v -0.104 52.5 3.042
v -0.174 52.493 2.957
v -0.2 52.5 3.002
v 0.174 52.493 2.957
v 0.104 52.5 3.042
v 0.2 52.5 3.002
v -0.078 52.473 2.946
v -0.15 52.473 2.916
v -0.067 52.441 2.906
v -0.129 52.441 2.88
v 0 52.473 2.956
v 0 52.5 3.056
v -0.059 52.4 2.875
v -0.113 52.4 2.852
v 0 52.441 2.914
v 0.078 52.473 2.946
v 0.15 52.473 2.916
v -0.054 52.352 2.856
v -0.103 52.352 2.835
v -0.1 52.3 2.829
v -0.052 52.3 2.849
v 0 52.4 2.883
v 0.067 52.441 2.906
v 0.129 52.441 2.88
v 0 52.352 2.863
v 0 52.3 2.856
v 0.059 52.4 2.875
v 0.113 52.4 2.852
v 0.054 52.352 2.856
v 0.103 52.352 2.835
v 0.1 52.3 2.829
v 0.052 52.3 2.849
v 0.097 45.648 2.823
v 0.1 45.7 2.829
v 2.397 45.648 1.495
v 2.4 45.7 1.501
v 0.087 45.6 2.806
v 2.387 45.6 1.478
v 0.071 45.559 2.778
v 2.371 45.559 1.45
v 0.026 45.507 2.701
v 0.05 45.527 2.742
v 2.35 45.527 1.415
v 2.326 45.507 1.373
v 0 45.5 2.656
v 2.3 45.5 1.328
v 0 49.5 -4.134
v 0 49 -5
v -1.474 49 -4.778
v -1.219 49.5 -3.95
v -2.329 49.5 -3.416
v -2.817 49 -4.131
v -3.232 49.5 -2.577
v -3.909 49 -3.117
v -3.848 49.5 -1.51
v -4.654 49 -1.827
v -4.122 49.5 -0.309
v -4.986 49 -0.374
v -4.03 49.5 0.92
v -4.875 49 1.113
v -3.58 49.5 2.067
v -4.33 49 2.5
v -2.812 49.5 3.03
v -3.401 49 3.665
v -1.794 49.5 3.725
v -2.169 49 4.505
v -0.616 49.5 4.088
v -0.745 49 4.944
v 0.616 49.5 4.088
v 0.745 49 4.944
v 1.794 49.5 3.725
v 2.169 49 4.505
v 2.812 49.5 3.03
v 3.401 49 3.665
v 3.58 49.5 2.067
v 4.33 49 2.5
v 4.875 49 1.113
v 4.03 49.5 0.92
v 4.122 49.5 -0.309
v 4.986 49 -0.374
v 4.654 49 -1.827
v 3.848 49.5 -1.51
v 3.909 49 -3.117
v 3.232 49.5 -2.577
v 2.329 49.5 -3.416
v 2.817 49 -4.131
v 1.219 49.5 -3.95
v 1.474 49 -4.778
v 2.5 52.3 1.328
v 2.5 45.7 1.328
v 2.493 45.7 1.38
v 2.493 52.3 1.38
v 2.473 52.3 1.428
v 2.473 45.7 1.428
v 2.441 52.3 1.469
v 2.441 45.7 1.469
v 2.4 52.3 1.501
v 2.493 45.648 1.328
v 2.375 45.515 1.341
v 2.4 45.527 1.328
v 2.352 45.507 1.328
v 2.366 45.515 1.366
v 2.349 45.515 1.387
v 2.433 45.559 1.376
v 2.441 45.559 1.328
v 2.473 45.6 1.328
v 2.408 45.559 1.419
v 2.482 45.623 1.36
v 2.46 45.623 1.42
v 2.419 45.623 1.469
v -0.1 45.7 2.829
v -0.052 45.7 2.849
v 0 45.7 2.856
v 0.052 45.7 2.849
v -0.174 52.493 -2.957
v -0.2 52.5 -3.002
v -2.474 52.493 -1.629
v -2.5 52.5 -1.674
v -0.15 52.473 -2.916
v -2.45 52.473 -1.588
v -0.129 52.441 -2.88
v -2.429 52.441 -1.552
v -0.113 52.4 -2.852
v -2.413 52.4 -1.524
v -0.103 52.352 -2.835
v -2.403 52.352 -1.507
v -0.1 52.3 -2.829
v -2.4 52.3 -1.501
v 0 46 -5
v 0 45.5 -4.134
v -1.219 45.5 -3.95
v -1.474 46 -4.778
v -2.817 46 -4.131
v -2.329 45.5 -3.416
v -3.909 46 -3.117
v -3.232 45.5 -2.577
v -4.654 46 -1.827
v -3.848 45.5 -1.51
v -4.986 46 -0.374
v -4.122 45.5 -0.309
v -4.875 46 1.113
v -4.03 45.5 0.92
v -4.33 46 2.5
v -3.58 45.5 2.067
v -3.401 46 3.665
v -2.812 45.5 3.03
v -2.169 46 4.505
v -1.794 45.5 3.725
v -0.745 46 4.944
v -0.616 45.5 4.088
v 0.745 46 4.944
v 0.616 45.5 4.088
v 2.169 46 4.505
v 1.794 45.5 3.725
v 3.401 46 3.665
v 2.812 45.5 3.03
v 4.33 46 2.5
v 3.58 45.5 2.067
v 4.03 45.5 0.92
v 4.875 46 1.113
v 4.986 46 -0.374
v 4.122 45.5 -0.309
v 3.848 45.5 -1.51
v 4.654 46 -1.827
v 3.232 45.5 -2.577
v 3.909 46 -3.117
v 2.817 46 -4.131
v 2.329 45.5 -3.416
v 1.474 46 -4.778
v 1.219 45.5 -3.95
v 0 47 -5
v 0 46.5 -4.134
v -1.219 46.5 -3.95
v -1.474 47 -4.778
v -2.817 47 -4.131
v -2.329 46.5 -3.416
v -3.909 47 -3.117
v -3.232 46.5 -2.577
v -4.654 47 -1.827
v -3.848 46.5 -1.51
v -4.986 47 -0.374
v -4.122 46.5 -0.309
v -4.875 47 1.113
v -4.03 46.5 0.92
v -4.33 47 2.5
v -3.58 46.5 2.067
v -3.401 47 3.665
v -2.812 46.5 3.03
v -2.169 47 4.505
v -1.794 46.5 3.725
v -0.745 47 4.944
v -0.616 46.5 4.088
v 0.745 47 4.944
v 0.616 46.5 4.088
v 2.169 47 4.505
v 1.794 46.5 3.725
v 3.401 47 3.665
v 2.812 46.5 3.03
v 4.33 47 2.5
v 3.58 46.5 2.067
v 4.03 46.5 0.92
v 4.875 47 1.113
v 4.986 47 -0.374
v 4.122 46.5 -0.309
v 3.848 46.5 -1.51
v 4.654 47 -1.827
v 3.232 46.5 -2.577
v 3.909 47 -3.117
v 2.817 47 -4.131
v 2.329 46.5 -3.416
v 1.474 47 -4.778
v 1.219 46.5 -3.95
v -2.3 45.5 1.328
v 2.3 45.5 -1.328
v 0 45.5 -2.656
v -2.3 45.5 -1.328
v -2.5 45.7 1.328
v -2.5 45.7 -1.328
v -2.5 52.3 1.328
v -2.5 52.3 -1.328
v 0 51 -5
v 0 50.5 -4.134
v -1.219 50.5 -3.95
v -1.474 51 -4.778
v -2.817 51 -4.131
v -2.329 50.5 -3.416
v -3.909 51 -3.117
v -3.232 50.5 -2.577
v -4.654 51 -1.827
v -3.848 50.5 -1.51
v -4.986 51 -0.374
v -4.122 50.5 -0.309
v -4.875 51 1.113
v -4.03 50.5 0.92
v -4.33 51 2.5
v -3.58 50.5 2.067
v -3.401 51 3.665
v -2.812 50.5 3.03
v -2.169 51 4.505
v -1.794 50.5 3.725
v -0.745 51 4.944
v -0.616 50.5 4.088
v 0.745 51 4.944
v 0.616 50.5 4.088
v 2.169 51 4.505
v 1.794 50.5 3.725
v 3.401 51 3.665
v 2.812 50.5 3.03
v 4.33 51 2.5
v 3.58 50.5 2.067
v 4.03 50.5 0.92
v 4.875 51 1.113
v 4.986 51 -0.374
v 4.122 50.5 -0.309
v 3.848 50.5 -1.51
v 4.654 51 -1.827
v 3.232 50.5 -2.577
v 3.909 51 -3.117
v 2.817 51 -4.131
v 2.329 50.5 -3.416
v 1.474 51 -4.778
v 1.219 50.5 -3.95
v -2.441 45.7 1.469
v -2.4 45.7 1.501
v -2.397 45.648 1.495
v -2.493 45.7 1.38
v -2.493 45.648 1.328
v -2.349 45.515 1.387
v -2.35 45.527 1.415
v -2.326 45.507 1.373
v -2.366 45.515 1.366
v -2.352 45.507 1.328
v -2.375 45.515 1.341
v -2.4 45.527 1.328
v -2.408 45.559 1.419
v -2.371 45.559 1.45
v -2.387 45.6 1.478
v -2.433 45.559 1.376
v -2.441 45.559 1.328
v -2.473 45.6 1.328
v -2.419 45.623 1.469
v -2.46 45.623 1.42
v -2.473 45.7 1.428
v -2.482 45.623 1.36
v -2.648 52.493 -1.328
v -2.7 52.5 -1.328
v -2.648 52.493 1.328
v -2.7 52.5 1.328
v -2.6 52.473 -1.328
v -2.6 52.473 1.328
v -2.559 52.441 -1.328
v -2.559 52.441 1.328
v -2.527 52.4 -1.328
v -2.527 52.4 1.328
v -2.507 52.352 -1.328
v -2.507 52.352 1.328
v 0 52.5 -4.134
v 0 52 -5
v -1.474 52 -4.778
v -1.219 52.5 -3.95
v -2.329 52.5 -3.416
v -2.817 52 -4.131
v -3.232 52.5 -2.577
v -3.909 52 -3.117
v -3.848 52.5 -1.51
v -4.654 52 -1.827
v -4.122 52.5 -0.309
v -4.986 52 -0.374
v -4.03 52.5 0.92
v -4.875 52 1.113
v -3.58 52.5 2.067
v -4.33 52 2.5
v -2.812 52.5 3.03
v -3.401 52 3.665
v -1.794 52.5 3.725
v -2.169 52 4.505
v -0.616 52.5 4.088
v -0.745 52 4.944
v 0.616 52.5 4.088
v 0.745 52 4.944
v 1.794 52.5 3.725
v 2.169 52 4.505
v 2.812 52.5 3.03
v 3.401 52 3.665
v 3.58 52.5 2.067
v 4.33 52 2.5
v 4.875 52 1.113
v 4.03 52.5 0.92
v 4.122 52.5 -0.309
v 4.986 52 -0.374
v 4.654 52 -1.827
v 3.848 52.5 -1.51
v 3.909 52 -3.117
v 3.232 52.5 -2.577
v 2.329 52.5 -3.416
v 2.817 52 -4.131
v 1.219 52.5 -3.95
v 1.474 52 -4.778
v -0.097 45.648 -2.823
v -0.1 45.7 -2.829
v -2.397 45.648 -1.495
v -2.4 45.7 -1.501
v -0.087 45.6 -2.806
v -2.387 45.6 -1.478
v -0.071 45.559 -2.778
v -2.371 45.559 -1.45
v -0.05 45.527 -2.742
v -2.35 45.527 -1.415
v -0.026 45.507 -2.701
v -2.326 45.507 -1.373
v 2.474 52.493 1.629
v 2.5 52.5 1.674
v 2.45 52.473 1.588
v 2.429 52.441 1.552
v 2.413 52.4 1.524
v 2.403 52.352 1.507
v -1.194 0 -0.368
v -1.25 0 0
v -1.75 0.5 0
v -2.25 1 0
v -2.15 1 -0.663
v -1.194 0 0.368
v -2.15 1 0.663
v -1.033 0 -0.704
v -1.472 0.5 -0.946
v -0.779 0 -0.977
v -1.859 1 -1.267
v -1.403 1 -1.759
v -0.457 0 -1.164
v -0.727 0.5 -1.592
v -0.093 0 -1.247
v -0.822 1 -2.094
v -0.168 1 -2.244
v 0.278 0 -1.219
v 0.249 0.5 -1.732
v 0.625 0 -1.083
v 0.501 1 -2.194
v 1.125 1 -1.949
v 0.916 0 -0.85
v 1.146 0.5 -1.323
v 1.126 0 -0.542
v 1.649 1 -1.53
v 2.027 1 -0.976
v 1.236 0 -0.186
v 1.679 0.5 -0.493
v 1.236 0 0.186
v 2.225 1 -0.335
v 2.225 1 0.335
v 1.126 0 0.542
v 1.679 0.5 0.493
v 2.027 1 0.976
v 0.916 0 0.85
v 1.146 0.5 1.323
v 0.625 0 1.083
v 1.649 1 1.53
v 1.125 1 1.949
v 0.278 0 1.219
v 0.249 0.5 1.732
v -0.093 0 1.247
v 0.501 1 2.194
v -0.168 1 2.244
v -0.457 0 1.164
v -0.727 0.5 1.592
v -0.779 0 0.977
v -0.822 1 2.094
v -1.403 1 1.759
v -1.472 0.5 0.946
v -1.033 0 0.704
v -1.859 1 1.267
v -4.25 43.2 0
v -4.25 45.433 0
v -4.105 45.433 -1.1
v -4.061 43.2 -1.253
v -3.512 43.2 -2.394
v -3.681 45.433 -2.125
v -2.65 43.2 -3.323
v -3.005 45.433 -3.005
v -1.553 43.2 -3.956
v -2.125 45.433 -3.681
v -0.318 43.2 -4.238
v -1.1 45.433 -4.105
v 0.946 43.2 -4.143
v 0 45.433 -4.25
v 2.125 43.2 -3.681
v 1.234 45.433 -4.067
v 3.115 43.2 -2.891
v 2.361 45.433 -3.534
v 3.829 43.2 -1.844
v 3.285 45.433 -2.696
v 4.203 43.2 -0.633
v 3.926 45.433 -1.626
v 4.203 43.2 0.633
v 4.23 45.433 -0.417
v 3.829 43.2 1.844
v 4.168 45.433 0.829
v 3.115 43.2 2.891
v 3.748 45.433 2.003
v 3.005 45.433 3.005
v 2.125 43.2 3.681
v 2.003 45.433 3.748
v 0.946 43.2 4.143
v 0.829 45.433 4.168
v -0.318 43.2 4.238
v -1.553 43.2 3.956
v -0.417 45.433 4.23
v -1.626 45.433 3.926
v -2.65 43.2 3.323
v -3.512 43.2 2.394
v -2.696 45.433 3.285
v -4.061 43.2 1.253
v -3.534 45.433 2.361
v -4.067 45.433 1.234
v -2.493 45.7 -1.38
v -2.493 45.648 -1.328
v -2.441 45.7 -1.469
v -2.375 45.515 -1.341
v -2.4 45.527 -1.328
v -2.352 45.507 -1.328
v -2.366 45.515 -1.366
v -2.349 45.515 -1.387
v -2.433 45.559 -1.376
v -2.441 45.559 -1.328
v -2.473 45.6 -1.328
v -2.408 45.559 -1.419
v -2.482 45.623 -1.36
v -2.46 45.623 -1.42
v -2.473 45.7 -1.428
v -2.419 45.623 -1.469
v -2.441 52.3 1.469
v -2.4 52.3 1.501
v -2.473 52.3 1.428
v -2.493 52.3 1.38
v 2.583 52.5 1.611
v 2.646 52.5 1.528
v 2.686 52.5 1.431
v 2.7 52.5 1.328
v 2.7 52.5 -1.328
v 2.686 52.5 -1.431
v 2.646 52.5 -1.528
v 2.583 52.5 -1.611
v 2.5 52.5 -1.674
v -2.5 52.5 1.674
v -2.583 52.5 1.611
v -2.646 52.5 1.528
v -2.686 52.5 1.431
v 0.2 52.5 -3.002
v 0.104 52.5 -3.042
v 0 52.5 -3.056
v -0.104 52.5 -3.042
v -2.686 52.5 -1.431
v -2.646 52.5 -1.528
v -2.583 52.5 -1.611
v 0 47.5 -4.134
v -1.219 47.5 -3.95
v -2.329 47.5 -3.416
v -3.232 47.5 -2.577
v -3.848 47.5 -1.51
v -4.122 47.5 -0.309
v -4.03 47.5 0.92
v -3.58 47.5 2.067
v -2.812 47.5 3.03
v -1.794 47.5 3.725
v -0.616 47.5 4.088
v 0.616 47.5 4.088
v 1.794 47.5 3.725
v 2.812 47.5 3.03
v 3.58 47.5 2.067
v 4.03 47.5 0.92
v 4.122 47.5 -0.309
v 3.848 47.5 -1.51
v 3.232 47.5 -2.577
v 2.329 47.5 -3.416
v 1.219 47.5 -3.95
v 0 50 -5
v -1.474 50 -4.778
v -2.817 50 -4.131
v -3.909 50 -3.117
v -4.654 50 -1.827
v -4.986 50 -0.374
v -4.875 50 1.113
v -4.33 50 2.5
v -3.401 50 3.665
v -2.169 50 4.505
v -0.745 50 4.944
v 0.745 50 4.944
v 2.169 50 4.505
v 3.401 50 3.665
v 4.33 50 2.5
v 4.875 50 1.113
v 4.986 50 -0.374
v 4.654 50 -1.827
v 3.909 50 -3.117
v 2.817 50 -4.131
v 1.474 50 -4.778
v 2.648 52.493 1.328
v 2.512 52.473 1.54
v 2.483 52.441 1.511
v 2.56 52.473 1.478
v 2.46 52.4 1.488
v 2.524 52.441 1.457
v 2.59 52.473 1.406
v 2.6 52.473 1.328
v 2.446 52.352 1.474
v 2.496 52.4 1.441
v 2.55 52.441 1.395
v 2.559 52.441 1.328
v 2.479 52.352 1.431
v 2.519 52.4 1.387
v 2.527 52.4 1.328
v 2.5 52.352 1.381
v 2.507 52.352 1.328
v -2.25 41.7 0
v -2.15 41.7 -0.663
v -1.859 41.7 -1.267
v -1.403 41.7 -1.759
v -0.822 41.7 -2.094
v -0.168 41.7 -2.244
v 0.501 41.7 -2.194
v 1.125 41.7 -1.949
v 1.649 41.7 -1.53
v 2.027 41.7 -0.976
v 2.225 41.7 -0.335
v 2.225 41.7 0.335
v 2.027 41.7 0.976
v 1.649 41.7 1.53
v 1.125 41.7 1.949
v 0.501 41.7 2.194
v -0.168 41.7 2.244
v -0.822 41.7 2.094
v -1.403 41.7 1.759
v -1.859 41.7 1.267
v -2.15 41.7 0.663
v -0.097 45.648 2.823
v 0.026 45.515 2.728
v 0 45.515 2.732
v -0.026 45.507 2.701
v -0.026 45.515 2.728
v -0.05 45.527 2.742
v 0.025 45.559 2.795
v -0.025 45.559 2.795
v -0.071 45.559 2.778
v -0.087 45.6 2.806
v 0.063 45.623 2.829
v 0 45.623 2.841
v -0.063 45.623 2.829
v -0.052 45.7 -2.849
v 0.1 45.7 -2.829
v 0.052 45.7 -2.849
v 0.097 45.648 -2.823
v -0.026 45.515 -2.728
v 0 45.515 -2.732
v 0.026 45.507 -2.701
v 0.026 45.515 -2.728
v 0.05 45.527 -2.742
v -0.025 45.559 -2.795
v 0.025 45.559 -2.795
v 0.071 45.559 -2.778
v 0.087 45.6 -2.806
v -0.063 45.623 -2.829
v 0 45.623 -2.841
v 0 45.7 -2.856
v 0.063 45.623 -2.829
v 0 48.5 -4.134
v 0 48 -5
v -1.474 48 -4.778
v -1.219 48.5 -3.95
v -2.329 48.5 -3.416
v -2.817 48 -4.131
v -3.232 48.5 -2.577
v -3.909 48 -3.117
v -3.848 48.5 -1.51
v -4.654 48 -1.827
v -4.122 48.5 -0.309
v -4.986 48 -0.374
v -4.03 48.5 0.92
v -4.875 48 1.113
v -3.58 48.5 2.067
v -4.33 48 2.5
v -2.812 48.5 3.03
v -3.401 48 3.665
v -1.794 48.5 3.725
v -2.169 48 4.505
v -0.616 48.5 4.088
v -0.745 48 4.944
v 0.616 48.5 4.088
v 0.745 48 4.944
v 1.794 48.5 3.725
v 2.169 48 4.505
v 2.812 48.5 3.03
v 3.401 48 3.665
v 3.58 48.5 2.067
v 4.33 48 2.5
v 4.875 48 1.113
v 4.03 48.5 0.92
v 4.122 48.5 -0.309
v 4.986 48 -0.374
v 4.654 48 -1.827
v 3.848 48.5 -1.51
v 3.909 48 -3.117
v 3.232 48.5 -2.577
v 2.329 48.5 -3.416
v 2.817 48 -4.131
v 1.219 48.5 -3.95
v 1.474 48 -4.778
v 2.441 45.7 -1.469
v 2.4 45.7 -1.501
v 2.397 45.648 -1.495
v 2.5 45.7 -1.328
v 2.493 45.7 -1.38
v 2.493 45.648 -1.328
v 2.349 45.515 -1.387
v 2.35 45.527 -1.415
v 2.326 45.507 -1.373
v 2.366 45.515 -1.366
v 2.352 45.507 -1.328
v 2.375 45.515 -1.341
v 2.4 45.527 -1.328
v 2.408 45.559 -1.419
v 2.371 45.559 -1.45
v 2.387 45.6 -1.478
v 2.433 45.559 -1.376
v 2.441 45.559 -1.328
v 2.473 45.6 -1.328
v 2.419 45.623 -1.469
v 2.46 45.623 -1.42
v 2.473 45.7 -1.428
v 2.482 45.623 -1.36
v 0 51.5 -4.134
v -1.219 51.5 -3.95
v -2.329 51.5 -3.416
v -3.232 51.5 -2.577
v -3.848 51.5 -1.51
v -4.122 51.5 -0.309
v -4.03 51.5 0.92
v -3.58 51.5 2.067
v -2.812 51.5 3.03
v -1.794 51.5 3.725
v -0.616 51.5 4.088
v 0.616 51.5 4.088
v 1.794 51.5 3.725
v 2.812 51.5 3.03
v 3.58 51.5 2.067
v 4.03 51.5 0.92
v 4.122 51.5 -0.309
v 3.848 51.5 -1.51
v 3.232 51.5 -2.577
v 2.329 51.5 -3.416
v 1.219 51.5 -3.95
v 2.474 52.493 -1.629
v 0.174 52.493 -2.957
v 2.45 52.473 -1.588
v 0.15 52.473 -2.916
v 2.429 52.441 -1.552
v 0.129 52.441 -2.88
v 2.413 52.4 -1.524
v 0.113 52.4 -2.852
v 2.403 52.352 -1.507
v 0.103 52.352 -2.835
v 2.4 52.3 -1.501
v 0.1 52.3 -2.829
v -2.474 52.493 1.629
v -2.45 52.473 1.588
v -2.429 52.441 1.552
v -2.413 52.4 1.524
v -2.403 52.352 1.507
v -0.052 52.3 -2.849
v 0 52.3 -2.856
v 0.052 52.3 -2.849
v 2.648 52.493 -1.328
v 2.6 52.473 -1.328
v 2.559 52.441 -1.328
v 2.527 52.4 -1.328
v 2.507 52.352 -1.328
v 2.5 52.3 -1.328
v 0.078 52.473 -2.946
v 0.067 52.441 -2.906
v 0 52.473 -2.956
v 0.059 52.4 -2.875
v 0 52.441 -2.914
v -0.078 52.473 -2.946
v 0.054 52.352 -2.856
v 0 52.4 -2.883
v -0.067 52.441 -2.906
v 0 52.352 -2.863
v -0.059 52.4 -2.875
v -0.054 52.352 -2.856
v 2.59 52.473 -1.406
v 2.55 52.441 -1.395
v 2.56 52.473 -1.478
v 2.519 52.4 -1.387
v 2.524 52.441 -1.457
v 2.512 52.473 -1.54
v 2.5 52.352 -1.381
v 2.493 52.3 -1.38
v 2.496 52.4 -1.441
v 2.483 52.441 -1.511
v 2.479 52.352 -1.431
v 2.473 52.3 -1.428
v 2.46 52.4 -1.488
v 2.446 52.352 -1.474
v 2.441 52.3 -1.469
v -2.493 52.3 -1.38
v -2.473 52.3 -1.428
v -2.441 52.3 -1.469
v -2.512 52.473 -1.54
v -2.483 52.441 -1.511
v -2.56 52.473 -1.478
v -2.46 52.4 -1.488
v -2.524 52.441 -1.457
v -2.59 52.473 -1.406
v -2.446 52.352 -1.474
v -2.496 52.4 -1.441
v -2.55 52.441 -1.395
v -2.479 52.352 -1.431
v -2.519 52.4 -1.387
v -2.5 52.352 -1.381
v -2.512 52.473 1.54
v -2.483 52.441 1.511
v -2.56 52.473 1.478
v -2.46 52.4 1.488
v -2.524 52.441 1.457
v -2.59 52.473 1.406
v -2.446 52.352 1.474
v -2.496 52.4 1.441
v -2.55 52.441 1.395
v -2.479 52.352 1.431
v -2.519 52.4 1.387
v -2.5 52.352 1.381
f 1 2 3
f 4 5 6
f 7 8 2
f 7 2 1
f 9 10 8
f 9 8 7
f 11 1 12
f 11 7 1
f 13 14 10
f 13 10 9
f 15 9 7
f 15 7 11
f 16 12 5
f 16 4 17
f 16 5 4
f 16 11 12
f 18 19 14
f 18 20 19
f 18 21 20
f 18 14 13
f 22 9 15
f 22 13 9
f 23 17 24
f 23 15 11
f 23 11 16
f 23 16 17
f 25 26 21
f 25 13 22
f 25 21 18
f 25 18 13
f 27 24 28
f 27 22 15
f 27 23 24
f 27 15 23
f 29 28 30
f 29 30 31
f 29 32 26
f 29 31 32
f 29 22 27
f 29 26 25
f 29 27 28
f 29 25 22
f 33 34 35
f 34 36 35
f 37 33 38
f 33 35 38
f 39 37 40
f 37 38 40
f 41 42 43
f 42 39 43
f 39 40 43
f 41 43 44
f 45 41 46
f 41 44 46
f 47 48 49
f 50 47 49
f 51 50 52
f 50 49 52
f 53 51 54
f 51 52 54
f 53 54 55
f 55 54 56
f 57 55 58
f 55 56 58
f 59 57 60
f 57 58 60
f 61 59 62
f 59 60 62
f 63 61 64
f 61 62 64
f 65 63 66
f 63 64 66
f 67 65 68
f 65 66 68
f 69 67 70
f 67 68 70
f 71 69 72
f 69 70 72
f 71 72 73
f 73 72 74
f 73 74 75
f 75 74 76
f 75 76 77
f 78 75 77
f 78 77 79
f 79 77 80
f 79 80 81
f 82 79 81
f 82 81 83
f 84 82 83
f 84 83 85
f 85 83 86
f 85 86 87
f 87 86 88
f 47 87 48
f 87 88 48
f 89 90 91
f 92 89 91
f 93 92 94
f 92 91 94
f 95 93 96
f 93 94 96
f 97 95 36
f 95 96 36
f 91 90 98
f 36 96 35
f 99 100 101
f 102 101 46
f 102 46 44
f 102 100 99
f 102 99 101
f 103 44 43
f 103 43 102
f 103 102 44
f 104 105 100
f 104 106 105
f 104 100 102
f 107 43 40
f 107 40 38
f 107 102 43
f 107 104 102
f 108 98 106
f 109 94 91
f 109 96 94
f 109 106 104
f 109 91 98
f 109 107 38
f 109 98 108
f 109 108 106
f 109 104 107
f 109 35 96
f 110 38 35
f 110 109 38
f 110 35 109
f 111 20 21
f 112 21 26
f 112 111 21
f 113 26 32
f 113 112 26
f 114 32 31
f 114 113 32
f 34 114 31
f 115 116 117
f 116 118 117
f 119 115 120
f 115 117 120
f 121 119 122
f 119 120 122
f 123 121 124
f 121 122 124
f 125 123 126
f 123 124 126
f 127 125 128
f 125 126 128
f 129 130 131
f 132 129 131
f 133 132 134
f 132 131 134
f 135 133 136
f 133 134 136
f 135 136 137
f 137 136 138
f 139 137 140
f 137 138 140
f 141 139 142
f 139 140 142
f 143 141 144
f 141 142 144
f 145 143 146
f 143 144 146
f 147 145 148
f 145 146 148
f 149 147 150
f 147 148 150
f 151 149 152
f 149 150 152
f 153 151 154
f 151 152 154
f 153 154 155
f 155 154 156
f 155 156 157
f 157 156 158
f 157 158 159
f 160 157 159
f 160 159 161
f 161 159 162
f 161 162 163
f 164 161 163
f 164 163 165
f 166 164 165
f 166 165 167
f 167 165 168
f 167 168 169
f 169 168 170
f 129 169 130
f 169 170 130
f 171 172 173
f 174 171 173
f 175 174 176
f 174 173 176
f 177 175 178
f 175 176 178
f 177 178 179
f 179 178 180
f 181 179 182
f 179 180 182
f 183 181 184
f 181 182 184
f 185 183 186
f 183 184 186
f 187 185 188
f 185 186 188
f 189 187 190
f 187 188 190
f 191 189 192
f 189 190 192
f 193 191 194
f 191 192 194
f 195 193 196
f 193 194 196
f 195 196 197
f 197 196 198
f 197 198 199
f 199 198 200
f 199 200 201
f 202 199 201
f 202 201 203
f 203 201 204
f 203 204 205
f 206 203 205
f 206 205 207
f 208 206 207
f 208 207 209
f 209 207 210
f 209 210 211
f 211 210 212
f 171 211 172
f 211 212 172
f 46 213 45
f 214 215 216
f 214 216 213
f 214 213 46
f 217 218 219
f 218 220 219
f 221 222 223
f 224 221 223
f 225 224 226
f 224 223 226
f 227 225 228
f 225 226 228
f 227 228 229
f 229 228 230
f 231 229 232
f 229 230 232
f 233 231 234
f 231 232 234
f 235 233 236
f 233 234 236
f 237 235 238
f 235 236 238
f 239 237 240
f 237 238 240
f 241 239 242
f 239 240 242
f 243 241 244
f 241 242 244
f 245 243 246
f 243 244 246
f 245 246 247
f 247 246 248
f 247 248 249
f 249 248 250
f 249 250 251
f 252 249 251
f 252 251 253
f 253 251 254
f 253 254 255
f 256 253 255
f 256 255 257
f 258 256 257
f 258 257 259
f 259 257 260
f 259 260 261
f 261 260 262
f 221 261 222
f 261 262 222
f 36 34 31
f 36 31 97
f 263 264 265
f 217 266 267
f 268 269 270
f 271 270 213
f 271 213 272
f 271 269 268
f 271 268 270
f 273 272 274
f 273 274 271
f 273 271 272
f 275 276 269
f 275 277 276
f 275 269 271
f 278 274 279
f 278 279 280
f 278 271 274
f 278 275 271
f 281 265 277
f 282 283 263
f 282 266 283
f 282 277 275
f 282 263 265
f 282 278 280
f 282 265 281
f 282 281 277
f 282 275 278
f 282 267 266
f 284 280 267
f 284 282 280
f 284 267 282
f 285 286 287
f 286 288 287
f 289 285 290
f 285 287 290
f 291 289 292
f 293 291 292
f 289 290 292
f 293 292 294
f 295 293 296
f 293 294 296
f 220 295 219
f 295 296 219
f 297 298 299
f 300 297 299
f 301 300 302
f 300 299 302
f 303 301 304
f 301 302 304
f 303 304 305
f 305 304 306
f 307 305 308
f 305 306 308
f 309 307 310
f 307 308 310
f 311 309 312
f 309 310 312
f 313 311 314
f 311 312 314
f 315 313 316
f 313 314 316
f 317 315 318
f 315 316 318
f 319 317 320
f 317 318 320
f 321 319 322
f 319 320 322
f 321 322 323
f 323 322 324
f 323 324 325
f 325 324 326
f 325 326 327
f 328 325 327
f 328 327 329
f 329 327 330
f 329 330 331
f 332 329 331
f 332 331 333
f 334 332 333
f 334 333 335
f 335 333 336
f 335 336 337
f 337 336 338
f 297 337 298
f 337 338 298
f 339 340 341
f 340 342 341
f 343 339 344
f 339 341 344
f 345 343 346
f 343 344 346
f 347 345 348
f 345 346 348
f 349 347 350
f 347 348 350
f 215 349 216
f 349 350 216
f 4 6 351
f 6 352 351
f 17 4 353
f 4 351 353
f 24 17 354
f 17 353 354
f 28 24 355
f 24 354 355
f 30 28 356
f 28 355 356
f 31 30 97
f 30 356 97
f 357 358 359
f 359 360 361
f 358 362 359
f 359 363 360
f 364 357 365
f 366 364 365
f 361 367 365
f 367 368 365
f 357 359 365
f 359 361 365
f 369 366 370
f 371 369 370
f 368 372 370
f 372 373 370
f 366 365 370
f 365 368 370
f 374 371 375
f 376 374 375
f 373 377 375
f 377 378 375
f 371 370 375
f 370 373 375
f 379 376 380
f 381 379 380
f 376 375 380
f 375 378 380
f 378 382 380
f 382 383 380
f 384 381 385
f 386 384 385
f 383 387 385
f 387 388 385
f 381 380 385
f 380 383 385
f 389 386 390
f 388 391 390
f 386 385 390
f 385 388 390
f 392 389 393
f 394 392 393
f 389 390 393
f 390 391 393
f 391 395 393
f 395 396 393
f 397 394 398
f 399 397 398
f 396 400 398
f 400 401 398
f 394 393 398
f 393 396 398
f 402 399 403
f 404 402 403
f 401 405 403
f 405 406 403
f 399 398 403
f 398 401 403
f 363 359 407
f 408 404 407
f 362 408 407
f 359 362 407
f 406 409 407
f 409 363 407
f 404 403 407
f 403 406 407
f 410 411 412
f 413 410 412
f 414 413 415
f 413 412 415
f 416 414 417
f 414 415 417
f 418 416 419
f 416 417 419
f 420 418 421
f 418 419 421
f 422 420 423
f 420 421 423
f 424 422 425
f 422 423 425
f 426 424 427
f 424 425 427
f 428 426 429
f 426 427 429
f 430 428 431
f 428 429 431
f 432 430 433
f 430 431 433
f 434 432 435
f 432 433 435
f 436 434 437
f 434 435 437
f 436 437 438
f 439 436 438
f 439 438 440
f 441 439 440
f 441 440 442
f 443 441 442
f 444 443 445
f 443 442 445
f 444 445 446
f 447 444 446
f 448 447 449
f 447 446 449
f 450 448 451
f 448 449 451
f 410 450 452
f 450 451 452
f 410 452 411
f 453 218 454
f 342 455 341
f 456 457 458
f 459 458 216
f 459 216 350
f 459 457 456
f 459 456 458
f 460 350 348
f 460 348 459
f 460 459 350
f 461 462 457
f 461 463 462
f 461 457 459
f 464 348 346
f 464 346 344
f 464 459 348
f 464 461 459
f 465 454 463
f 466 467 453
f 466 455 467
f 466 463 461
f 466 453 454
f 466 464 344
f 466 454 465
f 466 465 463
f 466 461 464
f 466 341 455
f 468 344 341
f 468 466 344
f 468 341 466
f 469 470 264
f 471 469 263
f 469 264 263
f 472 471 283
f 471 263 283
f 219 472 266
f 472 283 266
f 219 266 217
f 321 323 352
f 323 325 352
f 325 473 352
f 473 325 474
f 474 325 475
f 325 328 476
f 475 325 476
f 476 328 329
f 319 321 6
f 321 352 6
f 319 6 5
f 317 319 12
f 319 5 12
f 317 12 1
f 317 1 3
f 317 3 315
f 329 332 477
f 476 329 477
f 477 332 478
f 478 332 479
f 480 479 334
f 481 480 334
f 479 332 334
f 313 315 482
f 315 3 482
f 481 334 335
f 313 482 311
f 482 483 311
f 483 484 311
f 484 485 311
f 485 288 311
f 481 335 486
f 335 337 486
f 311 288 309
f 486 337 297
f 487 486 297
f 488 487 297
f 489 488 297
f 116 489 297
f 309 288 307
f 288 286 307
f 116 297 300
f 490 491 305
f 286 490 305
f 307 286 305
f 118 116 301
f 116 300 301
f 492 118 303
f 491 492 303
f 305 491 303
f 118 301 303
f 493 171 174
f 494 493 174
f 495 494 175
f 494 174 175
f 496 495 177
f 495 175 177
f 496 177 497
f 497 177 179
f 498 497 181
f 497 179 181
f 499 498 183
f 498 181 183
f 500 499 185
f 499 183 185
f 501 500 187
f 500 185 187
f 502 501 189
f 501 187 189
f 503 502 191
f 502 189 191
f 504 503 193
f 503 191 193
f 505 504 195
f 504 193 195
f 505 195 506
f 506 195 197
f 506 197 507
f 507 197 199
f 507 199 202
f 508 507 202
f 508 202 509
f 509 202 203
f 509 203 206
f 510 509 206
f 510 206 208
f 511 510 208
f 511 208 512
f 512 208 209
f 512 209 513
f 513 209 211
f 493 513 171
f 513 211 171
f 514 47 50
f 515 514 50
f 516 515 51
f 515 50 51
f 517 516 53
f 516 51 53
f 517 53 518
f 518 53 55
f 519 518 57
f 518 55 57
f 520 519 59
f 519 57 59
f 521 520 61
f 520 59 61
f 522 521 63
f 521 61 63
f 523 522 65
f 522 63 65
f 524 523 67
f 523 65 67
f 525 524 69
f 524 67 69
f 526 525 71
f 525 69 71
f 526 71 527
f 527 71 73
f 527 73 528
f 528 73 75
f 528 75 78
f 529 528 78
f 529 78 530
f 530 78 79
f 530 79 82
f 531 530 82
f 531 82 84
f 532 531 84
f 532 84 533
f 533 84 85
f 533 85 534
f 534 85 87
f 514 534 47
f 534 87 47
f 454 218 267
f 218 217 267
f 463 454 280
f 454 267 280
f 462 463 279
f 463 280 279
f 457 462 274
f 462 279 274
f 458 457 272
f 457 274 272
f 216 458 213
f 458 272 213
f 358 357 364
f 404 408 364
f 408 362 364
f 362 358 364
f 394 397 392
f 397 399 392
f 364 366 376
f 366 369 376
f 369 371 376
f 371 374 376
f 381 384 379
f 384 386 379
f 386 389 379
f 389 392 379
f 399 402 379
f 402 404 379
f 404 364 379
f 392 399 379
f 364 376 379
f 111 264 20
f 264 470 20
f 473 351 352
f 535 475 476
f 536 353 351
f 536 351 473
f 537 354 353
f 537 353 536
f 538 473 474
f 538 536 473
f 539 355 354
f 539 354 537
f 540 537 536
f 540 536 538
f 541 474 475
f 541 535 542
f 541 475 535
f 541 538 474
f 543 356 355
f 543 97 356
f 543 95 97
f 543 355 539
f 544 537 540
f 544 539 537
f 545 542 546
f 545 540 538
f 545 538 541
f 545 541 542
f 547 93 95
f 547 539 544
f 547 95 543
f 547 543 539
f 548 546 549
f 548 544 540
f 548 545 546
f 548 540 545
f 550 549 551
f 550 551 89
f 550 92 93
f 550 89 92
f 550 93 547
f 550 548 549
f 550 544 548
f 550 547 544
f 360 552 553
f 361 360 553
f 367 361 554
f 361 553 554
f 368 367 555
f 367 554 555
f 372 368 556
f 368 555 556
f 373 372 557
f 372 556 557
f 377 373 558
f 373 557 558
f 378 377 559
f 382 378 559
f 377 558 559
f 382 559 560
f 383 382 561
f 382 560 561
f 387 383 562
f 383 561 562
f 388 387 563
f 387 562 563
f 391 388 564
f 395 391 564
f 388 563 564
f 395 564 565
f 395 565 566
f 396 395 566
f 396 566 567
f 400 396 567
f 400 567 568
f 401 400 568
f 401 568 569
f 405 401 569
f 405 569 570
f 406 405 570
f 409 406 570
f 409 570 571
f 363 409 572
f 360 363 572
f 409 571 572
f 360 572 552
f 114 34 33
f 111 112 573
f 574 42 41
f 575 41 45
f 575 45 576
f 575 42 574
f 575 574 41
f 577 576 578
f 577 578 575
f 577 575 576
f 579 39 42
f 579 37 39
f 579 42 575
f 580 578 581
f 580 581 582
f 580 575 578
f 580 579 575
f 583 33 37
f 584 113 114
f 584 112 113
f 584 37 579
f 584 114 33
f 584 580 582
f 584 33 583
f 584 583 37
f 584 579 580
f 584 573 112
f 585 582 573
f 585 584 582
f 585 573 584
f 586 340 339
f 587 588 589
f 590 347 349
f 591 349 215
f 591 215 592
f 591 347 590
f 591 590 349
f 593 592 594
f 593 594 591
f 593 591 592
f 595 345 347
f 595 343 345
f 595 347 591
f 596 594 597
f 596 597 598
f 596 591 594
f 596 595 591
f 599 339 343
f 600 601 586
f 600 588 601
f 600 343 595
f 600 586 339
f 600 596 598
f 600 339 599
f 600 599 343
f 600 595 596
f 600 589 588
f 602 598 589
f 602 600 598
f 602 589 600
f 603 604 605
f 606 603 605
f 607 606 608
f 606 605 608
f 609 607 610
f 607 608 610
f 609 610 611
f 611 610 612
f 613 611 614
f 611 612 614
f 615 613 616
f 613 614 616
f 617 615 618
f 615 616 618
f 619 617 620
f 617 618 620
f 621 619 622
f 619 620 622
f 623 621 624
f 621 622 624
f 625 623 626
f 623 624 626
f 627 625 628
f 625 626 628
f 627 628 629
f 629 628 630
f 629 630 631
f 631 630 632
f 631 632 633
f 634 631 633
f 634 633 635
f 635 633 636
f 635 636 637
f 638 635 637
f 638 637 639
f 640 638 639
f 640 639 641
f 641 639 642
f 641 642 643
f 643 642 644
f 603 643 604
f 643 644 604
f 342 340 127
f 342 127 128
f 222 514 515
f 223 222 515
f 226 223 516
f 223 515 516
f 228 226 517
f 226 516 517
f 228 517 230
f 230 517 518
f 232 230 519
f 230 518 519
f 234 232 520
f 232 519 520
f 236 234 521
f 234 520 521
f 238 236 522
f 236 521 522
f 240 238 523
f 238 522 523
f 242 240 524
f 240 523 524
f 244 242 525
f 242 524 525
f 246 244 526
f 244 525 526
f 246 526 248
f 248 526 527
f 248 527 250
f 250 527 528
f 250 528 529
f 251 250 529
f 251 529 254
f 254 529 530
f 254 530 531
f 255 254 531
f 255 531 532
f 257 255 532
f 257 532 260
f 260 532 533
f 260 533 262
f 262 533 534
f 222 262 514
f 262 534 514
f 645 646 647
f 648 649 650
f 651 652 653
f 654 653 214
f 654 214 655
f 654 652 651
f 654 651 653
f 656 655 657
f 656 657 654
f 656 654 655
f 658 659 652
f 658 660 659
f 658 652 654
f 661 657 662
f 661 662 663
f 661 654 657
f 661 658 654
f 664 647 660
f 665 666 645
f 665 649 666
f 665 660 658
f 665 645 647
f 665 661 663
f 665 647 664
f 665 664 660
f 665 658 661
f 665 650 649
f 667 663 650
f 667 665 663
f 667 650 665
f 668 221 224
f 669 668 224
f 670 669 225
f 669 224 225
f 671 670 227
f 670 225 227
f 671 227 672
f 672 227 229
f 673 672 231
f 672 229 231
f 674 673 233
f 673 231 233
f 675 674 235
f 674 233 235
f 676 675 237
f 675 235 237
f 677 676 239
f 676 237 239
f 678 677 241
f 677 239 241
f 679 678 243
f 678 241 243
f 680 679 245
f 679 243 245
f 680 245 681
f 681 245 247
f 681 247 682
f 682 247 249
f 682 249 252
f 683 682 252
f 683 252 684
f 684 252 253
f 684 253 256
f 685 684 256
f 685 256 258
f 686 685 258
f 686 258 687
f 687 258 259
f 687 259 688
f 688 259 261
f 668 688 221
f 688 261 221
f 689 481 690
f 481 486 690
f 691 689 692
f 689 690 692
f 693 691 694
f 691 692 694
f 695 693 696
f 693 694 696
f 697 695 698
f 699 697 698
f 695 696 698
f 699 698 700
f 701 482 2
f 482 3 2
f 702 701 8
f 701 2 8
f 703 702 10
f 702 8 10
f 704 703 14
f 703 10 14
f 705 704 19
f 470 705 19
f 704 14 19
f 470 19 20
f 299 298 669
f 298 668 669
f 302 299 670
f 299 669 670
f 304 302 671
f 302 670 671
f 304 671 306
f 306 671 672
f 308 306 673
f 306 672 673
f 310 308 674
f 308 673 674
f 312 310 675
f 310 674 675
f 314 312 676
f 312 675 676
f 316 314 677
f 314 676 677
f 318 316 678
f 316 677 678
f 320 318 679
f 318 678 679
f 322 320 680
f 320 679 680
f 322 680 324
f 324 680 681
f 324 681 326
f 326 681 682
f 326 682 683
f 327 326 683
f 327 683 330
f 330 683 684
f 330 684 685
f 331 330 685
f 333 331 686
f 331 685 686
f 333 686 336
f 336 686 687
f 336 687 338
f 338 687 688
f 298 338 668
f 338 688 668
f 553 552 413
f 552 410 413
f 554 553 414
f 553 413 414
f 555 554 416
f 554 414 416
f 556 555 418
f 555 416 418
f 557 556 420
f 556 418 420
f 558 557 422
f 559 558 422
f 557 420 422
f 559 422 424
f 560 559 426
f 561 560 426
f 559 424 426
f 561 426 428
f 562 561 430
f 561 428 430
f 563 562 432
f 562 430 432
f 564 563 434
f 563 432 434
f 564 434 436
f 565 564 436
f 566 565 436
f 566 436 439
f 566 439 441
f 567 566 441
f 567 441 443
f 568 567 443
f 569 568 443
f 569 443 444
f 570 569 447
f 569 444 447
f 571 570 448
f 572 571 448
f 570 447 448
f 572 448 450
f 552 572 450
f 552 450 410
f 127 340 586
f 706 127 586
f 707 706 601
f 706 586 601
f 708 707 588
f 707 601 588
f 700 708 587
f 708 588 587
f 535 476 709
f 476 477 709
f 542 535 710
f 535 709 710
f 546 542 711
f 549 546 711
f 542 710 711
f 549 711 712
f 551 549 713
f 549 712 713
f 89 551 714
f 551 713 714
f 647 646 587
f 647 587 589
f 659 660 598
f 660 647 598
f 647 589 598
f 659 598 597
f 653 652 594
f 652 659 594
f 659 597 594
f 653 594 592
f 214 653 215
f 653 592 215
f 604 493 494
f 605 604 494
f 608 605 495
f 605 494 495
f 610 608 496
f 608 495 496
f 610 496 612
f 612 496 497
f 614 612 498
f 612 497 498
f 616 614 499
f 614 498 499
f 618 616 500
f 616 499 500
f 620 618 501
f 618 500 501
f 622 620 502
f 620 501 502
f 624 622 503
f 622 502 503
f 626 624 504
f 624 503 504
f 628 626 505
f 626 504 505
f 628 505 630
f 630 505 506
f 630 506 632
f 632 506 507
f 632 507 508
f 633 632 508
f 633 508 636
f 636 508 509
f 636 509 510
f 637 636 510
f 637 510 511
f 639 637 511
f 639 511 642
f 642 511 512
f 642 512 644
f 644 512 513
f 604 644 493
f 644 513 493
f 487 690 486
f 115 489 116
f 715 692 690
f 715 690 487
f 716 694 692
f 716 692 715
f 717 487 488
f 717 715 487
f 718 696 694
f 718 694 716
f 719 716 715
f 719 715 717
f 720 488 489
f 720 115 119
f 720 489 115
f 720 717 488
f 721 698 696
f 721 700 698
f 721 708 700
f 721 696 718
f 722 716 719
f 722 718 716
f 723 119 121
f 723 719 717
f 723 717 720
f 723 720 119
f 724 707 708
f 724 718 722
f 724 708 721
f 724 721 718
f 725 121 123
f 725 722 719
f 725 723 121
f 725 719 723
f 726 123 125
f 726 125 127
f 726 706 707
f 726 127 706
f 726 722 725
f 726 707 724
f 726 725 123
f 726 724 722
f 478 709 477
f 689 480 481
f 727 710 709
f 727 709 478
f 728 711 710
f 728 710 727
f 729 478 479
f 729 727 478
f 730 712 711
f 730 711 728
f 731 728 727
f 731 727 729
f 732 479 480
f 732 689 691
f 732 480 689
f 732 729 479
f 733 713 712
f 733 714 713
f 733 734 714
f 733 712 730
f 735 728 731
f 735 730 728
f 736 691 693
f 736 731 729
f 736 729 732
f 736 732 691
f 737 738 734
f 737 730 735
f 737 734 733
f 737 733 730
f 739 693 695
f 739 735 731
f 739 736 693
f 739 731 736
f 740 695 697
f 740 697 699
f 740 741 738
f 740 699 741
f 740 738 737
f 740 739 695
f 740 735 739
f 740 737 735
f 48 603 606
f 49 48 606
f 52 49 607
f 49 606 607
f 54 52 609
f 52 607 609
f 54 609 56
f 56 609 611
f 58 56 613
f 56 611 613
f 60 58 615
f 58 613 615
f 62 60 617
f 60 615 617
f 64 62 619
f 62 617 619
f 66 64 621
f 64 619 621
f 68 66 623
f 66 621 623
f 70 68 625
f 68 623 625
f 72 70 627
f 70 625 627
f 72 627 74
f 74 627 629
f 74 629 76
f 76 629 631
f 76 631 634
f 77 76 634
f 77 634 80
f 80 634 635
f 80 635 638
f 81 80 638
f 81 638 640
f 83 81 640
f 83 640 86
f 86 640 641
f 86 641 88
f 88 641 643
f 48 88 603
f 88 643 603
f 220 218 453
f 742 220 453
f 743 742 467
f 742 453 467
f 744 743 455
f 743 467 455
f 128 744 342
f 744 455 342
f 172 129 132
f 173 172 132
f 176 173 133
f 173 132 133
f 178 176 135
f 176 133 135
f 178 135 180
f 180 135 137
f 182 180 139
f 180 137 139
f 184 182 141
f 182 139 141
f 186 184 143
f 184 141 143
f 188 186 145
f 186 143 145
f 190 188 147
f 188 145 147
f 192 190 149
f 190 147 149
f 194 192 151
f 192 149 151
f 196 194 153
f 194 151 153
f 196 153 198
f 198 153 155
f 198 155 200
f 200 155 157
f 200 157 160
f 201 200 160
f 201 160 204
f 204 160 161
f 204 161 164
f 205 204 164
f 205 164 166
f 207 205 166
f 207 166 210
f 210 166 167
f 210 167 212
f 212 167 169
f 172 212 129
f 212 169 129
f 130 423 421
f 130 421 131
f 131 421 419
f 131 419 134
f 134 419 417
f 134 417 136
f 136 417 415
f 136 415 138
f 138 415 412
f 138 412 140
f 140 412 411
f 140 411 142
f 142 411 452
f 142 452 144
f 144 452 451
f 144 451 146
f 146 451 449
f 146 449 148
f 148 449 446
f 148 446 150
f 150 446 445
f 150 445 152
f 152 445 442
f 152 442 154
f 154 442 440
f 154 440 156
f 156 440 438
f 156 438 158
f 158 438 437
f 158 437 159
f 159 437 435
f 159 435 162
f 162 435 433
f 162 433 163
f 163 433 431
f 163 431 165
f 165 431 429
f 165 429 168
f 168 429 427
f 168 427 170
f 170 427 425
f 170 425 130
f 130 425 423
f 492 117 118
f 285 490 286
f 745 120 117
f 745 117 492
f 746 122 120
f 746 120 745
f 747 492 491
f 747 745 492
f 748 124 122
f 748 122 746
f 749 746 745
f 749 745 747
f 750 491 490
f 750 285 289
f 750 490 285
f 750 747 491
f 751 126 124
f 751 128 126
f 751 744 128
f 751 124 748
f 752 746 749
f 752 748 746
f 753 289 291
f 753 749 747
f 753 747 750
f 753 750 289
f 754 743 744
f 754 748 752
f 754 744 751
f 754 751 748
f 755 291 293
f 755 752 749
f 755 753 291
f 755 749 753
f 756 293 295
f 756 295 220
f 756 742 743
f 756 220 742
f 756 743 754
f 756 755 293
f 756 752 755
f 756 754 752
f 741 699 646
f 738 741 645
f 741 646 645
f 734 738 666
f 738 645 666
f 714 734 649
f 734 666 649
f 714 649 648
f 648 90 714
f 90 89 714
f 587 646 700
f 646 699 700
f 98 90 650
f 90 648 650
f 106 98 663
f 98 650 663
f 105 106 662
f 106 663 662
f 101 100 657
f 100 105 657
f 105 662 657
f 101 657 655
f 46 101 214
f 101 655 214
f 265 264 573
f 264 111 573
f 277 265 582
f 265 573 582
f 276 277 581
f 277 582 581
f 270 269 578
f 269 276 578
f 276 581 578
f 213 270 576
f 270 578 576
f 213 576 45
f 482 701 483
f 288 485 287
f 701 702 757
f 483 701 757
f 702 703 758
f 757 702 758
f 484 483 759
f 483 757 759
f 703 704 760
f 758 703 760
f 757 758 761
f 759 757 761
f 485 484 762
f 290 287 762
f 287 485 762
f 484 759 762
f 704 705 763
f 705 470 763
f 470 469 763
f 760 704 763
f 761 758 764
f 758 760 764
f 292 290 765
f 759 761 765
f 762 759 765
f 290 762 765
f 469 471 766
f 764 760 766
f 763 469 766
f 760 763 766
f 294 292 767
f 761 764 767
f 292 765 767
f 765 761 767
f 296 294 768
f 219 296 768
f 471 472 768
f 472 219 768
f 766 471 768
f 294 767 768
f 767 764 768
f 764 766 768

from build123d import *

# Parameters (mm, degrees)
CHAMFER1_SIZE      = 1
CHAMFER2_SIZE      = 0.5
CUT_EXTRUDE1_DEPTH = 7
FILLET1_R          = 0.2


with BuildPart() as part:
    # Sketch1 → Revolve1 (revolve)
    with BuildSketch(Plane.XY):
        Polygon((0, 0), (-2.25, 0), (-2.25, 41.7), (-4.25, 43.2), (-4.25, 45.5), (-5, 45.5), (-5, 52.5), (0, 52.5), align=None)
    revolve(axis=Axis((0, 52.5, 0), (0, -1, 0)))

    # Chamfer1
    chamfer1_edges = [part.edges().sort_by_distance(p)[0] for p in [
        (2.25, 0, 0),
    ]]
    chamfer(chamfer1_edges, length=CHAMFER1_SIZE)

    # Chamfer2
    chamfer2_edges = [part.edges().sort_by_distance(p)[0] for p in [
        (5, 52.5, 0),
    ]]
    chamfer(chamfer2_edges, length=CHAMFER2_SIZE)

    # Sketch2 → Cut-Extrude1 (cut)
    with BuildSketch(Plane(origin=(0, 52.5, 0), x_dir=(1, 0, 0), z_dir=(0, 1, 0))):
        Polygon((0, -2.886751346), (2.5, -1.443375673), (2.5, 1.443375673), (0, 2.886751346), (-2.5, 1.443375673), (-2.5, -1.443375673), align=None)
    extrude(amount=-CUT_EXTRUDE1_DEPTH, mode=Mode.SUBTRACT)

    # Fillet1
    fillet1_edges = [part.edges().sort_by_distance(p)[0] for p in [
        (-1.25, 45.5, 2.165063509),
        (0, 49, 2.886751346),
        (-2.5, 45.5, 0),
        (-2.5, 49, 1.443375673),
        (-1.25, 45.5, -2.165063509),
        (-2.5, 49, -1.443375673),
        (1.25, 45.5, -2.165063509),
        (0, 49, -2.886751346),
        (2.5, 45.5, 0),
        (2.5, 49, -1.443375673),
        (1.25, 45.5, 2.165063509),
        (2.5, 49, 1.443375673),
        (-1.25, 52.5, 2.165063509),
        (1.25, 52.5, 2.165063509),
        (2.5, 52.5, 0),
        (1.25, 52.5, -2.165063509),
        (-1.25, 52.5, -2.165063509),
        (-2.5, 52.5, 0),
    ]]
    fillet(fillet1_edges, radius=FILLET1_R)

    # Sketch3 → Cut-Revolve1 (revolve, cut)
    with BuildSketch(Plane.XY, mode=Mode.PRIVATE) as cut_revolve1_sk:
        Polygon((5, 52), (4.133974596, 51.5), (5, 51), align=None)
        Polygon((5, 51), (4.133974596, 50.5), (5, 50), align=None)
        Polygon((5, 50), (4.133974596, 49.5), (5, 49), align=None)
        Polygon((5, 49), (4.133974596, 48.5), (5, 48), align=None)
        Polygon((5, 48), (4.133974596, 47.5), (5, 47), align=None)
        Polygon((5, 47), (4.133974596, 46.5), (5, 46), align=None)
        Polygon((5, 46), (4.133974596, 45.5), (5, 45), align=None)
        Polygon((5, 53), (4.133974596, 52.5), (5, 52), align=None)
    revolve(cut_revolve1_sk.sketch.rotate(Axis((0, 53.547255409, 0), (0, 1, 0)), 90), axis=Axis((0, 53.547255409, 0), (0, 1, 0)), mode=Mode.SUBTRACT)


solid = part.part
